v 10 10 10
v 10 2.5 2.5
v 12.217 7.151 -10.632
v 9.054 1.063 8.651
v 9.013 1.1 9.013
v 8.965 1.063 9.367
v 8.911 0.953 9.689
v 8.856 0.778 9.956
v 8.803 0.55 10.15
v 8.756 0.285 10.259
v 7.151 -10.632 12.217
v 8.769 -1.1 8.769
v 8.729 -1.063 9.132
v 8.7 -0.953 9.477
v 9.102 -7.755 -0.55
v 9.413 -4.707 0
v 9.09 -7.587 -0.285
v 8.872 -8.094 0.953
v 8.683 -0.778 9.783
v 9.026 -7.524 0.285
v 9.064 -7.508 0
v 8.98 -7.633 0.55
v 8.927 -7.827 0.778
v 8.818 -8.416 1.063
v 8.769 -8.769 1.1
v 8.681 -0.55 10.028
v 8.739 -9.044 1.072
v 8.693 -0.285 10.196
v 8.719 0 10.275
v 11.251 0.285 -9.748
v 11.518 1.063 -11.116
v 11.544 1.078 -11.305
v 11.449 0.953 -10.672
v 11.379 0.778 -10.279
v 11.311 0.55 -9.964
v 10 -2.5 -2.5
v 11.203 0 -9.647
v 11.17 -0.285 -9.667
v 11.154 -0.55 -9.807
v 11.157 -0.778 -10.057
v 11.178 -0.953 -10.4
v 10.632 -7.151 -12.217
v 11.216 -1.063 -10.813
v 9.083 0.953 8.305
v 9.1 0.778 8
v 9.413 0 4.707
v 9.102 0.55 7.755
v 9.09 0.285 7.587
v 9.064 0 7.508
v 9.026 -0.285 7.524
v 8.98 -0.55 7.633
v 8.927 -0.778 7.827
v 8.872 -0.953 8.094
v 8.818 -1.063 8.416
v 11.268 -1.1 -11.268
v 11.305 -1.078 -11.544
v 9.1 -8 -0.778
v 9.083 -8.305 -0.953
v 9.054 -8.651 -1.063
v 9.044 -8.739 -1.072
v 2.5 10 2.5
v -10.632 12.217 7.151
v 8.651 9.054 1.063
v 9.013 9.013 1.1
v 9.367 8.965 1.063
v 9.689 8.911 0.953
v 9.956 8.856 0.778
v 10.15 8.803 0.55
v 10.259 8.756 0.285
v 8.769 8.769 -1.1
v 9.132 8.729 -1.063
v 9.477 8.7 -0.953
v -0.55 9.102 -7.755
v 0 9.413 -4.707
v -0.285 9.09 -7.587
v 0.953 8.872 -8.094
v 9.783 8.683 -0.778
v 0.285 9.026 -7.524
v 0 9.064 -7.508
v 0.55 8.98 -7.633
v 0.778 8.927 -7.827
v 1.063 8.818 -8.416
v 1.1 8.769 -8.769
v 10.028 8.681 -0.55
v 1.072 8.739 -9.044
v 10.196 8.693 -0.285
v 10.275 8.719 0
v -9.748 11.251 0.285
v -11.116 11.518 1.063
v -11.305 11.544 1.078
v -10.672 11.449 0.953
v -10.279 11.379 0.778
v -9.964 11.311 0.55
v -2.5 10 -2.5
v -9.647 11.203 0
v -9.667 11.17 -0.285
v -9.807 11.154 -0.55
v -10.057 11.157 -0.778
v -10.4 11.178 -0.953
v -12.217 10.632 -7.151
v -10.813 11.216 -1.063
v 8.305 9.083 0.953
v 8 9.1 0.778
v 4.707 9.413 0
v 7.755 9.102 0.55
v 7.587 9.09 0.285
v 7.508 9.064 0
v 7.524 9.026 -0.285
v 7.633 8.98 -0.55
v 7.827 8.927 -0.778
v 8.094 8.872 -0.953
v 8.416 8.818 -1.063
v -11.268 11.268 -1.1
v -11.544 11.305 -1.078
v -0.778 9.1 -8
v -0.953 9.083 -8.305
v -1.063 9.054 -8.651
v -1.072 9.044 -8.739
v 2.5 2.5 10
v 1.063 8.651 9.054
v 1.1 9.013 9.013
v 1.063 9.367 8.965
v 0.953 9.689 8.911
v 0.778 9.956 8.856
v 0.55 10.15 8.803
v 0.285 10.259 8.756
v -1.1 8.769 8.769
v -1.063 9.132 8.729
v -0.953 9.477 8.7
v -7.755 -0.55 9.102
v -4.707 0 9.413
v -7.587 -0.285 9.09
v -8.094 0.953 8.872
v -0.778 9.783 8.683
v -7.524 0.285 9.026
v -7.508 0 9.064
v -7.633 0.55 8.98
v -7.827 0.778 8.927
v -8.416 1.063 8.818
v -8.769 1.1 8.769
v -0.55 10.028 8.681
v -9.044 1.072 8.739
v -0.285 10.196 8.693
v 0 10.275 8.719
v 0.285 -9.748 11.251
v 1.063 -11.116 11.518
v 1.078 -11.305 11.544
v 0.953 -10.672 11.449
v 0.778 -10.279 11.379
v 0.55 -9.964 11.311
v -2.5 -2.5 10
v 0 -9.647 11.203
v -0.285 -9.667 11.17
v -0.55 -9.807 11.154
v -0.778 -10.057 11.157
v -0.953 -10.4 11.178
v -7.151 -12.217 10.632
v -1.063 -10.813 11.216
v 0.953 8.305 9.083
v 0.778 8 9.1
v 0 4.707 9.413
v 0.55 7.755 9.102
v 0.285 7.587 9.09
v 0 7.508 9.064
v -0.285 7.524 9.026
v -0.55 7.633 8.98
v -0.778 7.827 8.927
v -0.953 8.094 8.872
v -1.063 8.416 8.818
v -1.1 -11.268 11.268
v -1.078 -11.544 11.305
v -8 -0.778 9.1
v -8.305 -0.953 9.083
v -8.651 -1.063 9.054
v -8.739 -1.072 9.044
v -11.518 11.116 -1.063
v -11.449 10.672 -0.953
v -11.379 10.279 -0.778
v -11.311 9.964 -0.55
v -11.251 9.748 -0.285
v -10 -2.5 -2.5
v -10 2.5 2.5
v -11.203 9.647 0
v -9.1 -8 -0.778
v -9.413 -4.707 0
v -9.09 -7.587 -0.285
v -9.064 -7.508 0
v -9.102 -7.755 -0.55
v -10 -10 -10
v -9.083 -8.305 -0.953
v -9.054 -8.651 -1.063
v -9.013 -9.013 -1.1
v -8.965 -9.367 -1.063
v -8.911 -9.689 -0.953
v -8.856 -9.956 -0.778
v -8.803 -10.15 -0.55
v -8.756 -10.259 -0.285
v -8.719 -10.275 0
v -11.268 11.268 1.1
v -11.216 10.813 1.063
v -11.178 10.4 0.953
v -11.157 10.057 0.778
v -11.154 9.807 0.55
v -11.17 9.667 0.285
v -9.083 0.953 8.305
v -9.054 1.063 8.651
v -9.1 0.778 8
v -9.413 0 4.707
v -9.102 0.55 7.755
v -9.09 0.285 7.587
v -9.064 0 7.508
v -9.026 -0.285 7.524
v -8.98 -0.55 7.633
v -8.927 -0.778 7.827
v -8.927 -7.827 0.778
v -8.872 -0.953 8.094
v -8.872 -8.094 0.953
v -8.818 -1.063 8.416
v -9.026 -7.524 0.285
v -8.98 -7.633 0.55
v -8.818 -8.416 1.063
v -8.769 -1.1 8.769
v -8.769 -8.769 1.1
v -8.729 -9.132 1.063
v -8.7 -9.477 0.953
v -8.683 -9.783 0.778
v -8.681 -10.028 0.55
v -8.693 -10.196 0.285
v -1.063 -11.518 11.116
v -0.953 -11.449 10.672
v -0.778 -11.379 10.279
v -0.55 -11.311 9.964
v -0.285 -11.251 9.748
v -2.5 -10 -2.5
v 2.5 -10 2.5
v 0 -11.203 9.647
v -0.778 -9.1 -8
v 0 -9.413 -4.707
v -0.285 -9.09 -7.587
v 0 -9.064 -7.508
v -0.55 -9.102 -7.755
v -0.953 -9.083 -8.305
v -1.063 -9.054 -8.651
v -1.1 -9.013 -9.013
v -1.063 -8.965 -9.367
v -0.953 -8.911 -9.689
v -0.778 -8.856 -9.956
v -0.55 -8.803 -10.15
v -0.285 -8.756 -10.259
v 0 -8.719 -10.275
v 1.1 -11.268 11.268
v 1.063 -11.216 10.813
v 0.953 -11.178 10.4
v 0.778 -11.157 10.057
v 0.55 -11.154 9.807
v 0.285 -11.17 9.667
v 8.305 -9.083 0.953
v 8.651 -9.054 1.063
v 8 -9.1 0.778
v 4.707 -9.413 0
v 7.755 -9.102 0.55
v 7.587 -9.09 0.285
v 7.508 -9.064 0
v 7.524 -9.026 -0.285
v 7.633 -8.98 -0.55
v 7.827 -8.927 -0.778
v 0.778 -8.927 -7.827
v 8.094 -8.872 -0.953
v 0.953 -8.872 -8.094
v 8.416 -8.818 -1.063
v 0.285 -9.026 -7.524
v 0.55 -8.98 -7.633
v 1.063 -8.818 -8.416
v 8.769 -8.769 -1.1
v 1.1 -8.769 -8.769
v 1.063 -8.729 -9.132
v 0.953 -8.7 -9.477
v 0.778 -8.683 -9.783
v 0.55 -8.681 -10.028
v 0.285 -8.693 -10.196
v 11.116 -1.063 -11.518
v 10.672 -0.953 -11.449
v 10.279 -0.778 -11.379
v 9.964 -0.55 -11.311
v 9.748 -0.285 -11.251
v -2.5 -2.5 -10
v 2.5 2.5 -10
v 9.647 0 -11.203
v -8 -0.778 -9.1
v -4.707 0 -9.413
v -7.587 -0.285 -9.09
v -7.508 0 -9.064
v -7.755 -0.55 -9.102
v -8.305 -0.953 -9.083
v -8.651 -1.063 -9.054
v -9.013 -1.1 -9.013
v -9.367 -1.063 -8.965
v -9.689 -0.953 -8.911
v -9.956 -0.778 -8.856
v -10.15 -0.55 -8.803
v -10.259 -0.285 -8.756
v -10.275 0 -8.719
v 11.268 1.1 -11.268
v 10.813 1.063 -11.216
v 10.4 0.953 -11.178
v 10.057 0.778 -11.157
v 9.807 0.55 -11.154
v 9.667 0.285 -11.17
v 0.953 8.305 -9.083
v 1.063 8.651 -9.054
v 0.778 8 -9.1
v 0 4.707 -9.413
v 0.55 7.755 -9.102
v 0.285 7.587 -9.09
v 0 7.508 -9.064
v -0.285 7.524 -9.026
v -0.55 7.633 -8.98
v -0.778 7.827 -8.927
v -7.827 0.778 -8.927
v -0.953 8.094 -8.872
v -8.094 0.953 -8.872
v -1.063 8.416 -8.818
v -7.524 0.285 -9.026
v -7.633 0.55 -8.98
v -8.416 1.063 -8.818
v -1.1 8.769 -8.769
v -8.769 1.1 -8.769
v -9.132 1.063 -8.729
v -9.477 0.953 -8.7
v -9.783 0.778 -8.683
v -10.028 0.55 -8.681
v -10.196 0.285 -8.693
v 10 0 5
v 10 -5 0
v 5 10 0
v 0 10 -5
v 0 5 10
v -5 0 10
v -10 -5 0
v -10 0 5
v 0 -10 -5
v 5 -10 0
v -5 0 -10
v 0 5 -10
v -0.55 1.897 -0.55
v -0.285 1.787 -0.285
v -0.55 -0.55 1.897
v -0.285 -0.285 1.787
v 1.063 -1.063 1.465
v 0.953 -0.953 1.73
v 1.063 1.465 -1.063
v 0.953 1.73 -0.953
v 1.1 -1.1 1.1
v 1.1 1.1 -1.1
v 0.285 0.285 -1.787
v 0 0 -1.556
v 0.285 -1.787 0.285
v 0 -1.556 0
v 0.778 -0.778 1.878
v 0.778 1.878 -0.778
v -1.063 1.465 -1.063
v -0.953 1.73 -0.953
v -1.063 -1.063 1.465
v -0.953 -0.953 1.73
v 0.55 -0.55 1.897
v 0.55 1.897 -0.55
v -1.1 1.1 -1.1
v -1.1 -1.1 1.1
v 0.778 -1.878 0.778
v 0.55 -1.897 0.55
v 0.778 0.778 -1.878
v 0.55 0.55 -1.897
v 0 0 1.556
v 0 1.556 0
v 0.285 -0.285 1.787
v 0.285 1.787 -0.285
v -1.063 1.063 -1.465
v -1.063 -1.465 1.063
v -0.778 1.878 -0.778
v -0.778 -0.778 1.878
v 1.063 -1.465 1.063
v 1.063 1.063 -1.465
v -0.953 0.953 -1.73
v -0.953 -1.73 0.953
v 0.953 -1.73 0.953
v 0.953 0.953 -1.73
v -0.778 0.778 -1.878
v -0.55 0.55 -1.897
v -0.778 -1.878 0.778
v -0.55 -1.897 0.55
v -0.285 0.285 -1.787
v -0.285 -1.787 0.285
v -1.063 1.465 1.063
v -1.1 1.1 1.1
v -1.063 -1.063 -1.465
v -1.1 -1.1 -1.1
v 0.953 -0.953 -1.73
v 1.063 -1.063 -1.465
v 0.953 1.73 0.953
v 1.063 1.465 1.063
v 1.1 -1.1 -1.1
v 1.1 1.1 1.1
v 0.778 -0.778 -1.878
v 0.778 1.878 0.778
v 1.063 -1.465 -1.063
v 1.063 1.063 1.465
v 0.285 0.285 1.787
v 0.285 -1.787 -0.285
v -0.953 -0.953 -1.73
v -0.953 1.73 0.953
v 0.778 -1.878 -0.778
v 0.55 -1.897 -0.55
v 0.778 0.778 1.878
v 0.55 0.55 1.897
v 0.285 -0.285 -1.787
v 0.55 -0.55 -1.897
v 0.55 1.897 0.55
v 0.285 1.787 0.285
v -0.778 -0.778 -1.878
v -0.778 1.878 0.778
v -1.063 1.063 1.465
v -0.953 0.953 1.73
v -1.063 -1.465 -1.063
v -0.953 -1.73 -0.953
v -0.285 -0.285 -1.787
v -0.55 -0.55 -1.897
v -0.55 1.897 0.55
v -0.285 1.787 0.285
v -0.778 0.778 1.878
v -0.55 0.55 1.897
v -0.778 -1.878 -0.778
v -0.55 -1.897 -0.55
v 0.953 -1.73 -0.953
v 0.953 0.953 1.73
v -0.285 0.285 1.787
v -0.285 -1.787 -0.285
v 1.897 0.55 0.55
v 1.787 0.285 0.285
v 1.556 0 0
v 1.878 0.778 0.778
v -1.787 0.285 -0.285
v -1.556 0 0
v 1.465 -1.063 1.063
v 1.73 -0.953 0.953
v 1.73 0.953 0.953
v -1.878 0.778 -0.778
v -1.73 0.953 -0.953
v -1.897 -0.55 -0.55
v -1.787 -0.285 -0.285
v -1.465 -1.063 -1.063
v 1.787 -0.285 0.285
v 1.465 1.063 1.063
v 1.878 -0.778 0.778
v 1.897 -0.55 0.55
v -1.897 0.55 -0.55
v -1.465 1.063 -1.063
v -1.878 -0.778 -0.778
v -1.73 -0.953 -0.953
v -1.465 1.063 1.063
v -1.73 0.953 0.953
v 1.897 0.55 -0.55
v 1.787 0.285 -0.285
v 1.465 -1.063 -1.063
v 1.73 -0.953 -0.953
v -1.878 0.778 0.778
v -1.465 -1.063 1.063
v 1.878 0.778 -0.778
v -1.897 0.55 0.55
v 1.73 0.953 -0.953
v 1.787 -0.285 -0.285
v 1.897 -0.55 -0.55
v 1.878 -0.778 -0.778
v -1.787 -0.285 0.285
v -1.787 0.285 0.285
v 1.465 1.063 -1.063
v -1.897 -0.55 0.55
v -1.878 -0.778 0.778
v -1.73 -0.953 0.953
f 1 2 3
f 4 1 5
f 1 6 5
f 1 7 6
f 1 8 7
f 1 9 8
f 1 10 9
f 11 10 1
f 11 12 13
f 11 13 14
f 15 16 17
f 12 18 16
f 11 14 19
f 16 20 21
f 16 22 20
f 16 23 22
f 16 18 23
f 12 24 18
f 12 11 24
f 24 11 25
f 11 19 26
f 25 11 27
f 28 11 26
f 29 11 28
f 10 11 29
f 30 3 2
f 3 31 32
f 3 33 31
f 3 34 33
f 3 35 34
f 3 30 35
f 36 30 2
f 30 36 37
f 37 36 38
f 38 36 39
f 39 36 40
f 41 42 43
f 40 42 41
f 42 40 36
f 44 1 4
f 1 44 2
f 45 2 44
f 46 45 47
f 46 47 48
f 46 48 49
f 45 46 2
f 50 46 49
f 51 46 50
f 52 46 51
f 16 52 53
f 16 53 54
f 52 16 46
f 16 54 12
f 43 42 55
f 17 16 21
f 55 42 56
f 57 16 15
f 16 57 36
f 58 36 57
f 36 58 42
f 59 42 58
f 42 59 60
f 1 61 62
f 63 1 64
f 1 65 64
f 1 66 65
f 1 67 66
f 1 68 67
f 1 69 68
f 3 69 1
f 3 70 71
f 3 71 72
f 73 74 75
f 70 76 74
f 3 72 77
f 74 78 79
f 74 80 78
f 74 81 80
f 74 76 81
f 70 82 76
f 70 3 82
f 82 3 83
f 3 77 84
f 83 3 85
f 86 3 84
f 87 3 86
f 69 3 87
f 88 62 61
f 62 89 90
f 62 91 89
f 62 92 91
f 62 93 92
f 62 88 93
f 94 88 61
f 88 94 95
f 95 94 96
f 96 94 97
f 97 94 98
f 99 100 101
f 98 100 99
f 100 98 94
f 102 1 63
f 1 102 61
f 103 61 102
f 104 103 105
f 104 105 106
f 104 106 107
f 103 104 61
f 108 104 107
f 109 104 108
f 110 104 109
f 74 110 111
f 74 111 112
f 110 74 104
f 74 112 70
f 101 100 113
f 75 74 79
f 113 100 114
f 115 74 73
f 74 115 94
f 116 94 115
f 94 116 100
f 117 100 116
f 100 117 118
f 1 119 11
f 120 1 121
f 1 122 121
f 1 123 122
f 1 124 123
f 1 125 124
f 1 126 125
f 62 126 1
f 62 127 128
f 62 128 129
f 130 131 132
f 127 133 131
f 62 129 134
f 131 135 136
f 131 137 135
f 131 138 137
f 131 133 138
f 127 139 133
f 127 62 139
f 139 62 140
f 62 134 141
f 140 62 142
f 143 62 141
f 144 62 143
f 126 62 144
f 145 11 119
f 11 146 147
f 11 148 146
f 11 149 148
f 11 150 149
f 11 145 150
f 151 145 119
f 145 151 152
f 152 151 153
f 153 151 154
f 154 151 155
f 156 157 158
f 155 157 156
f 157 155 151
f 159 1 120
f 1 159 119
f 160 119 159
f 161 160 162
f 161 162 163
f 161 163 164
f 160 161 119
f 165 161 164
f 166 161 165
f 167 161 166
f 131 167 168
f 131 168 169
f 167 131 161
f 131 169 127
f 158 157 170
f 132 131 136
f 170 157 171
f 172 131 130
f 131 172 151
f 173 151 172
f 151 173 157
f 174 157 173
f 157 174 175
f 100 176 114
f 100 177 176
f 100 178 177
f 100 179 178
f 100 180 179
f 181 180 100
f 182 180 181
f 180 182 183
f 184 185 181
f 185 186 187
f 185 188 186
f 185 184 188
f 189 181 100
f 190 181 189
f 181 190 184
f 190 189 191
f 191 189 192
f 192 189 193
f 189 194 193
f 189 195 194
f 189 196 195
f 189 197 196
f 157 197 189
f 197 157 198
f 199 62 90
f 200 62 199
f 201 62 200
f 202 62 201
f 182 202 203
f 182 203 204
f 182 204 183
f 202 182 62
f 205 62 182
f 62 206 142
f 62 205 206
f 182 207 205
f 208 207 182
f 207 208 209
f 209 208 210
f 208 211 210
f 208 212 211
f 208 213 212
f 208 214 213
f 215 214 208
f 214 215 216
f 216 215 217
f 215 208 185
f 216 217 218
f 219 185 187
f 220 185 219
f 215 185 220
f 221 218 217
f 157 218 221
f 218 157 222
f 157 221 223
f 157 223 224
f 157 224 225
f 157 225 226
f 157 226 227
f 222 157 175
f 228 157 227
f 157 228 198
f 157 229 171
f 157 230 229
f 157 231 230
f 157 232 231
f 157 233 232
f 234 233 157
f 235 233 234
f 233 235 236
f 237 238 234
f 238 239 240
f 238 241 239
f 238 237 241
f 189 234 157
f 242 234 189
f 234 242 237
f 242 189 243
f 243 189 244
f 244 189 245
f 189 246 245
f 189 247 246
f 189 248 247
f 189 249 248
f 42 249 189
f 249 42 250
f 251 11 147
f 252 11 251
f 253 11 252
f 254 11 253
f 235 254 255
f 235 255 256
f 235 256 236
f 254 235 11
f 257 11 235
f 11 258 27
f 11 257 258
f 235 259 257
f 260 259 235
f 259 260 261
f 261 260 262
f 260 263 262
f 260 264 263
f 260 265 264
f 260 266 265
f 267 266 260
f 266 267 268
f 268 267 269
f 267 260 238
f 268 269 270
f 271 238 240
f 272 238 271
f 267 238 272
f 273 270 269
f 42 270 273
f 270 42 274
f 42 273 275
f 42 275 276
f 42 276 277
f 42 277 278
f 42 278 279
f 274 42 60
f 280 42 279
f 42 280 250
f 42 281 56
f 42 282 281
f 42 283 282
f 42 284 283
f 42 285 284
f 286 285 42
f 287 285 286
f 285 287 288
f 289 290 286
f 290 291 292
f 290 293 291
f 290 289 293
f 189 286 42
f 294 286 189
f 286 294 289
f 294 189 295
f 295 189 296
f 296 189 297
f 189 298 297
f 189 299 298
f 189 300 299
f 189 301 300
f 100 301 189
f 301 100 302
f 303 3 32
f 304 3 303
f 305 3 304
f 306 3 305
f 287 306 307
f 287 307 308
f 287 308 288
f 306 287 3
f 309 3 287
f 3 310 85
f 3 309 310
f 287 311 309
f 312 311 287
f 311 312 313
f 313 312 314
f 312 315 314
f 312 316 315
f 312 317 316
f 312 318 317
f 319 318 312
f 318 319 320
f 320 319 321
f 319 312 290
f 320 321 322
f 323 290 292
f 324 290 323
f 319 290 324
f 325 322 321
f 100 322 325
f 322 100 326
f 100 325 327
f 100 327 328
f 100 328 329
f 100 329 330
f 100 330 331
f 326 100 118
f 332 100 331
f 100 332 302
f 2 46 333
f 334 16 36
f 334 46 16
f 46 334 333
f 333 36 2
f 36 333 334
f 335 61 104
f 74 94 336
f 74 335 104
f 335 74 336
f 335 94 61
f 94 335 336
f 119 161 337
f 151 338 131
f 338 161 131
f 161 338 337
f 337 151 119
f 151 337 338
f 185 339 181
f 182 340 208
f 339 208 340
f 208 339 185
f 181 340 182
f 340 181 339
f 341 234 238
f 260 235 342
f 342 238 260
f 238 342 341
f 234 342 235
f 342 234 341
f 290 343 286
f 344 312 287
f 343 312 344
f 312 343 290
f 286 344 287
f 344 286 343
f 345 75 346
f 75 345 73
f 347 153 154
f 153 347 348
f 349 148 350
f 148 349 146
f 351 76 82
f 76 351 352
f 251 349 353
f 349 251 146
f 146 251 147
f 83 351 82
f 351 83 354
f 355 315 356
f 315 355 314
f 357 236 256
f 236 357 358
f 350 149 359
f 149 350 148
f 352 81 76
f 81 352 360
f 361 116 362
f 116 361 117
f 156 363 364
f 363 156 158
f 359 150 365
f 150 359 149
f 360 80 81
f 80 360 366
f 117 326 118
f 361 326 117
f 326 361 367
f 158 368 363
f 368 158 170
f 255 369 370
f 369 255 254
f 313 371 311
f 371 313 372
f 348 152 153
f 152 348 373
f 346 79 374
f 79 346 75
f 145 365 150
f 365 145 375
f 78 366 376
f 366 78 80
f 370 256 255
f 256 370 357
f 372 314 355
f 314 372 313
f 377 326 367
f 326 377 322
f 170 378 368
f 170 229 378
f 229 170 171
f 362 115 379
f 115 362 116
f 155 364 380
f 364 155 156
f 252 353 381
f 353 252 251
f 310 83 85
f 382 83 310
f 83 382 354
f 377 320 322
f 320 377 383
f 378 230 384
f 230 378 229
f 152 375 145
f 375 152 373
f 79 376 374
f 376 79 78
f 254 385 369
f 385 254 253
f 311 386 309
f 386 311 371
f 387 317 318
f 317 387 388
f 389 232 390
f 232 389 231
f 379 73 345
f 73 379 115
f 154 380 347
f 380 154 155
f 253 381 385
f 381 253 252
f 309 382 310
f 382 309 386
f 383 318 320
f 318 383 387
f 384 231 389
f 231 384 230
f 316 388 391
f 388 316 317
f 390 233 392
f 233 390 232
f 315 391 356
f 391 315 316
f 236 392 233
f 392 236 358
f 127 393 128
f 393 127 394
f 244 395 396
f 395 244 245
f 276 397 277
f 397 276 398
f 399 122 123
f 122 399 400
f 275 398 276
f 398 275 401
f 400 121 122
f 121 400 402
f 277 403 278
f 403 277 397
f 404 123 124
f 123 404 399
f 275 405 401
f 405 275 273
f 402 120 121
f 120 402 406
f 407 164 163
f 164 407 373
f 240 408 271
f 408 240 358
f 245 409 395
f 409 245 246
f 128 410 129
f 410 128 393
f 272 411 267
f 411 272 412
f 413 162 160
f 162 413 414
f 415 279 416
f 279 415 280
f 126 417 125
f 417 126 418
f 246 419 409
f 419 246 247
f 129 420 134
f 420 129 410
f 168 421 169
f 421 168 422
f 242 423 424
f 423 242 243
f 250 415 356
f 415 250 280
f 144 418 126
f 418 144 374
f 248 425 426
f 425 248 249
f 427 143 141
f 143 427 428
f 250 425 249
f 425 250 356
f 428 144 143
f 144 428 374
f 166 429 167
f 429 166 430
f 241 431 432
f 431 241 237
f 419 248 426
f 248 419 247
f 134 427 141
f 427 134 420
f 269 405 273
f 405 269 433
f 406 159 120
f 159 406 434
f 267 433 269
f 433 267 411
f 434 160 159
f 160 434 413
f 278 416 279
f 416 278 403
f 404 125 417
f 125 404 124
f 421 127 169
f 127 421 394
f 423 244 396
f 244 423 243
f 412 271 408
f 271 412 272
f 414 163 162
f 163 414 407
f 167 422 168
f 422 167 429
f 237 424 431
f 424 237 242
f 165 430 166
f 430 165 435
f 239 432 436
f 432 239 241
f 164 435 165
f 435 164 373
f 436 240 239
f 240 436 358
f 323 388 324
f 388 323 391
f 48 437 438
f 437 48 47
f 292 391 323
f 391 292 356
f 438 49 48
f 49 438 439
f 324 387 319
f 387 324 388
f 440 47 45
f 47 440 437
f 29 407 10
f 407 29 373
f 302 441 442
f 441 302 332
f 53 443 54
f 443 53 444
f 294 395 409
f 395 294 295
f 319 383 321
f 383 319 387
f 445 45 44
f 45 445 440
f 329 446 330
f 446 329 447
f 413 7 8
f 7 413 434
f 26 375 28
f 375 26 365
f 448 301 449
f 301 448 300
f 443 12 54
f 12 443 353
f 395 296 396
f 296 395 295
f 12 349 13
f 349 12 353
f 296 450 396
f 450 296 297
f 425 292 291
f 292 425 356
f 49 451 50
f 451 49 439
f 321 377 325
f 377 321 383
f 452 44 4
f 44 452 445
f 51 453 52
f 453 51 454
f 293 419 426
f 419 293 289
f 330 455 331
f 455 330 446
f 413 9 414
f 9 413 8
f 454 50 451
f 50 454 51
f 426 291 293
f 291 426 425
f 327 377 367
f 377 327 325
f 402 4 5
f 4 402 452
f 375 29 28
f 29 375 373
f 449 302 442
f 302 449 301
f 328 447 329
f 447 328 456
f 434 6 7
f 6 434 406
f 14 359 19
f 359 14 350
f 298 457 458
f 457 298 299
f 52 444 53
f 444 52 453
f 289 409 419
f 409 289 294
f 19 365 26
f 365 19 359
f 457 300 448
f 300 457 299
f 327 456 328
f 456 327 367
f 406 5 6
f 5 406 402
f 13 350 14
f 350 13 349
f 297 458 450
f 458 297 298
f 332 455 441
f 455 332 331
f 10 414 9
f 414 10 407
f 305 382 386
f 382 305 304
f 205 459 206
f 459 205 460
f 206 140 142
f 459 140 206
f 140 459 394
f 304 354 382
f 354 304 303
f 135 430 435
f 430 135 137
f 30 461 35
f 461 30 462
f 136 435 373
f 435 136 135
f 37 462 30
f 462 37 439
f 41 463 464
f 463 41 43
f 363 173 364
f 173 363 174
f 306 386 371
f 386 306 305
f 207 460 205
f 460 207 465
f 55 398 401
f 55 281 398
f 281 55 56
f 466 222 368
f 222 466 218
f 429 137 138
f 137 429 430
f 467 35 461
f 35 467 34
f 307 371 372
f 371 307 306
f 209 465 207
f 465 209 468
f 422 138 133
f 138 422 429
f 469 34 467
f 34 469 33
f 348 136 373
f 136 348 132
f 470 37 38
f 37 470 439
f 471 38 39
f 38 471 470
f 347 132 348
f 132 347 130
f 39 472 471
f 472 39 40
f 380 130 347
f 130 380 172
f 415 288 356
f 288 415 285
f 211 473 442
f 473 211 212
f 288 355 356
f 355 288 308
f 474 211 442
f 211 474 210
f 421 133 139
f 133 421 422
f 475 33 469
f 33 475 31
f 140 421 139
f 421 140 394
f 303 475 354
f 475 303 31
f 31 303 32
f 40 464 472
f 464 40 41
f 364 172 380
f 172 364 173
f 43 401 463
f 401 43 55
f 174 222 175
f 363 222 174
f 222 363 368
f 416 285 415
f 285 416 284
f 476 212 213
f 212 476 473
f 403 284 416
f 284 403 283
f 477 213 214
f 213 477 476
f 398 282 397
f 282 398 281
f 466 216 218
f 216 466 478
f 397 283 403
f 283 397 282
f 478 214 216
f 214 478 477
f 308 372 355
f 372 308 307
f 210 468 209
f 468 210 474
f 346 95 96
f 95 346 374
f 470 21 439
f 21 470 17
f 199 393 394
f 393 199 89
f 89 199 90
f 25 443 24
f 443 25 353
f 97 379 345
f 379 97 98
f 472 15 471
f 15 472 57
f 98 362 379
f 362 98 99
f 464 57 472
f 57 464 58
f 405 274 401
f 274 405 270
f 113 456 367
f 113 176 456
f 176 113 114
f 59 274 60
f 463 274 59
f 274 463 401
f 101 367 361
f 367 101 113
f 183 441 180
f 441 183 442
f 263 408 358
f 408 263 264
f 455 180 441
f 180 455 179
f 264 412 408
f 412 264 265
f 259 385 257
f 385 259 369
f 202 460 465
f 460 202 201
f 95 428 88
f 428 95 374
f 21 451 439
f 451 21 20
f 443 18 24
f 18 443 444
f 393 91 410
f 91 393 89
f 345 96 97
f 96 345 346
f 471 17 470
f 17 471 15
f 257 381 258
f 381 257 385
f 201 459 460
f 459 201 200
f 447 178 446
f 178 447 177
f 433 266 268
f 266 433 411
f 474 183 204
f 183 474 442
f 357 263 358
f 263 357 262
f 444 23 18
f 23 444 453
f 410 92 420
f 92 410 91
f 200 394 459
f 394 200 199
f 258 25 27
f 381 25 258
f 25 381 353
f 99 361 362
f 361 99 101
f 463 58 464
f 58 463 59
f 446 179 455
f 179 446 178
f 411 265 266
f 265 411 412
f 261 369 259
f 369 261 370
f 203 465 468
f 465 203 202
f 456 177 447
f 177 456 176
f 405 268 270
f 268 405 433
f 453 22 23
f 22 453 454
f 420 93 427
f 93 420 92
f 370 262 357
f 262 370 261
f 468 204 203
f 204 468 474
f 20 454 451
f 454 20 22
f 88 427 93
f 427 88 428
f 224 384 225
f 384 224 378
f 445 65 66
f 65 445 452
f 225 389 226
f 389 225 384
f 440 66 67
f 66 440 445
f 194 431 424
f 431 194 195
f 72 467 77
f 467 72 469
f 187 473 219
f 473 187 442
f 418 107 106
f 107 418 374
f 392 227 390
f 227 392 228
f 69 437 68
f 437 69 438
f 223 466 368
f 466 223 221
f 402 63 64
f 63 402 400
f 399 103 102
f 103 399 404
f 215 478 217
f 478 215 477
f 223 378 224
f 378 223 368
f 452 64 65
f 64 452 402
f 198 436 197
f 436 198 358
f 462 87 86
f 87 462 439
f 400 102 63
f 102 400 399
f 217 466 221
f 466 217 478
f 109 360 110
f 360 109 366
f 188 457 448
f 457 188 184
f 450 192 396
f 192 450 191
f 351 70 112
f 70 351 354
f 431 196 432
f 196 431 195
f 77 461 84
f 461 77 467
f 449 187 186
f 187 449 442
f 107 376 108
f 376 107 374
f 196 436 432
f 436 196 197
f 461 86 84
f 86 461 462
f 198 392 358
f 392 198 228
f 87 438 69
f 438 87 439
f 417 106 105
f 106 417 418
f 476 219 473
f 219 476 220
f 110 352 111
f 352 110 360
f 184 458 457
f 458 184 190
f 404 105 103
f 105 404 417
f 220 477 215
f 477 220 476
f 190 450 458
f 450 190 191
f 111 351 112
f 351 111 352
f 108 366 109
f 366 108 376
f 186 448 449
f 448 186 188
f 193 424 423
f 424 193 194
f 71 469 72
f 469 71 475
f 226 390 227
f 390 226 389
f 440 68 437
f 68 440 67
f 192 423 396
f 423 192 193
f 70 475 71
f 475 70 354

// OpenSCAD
//Шаг сетки для решётки из усечённых октаэдров (межцентровое расстояние)
MM_GRID_STEP = 20;

//диаметр отвертия (диаметр описанной окружности около многоугольника детализации)
//если диаметр = 0, то отверстий нет, 2.2 = диаметр зубочистки
MM_HOLE_DIAMETER = 2.2;

//true либо false параметр, показывающия исходный ромбододекаэдр без скоса
//для подсветки и разработки делай true, для 3Д-печати делай false
WILL_SHOW_CORE = true;

//показывать цвета
WILL_SHOW_COLOR = true;

//надо ли класть фигуру на жёлтую грань?
WILL_PUT_ON_YELLOW_FACE = false;

//длина укороченной чёрной стороны (когда 1 - ось поворта по короткой диагонали)
//ось поворота - это граница цветов 
CUT_RATIO = 0.5;

//синее море внизу и белое небо сверху, если угол положительный
CUT_DEGREE = 10;

//такой n-угольник для детализации отверстия
HOLE_DETALISATION_IS_N_POLYGON = 24;


//дальше параметры не менять
CR = MM_GRID_STEP / 2;
N_ALL_FACES = 6;

//тетраэдр по четырём точкам, точка номер ноль - вершина
module m_tetrahedron(p4) {
    polyhedron(points=p4, faces=[[0,1,2],[0,2,3],[0,3,1],[3,2,1]]);
}

//пирамида с четырёхугольноком в основании, точка номер ноль - вершина
module m_p5_pyramid(p5) {
    polyhedron(points=p5, faces=[[0,1,2],[0,2,3],[0,3,4],[0,4,1],[4,3,2,1]]);
}

//пирамида с треугольным или четырёхугольным основанием
module m_p4_p5(p4_or_p5) {
    if (len(p4_or_p5) != 5) {m_tetrahedron(p4_or_p5);} else {m_p5_pyramid(p4_or_p5);}
}

//интерполирование по прямой с точками р0(ноль) и р1(один) любым вещественным числом
//массивы (три координаты) тоже можно складывать и умножать на число
function f_n01(p0, p1, n01) = ((p1 - p0) * n01) + p0;

//сумма массива с любым числом точек (рекурсивно)
function f_sum_recursion(array_p, my_result, i) =
    ((i>=len(array_p)) ?
        my_result :
        f_sum_recursion(array_p, my_result + array_p[i], i+1));

//сумма векторов, array_p[0] * 0 - нужно, чтобы получить необходимое число нулей [0,0,0]
function f_sum(array_p) = f_sum_recursion(array_p, array_p[0] * 0, 0);

//центр массива точек
function f_center(array_p) = f_sum(array_p) * (1 / len(array_p));

//синтаксис для переменных (в том числе, функциональных переменных)
//my_scale - во сколько раз раздувать (масштабировать) треугольник или 4 точки
function f_three_or_four_points_extend(p3_or_p4, my_scale = 1) =
    //центр тяжести треугольника или четырёх точек
    let (c = f_center(p3_or_p4))
    //функцция раздувания трёх или четырёх точек с сохранением чентра тяжести
    let (f = function (i) f_n01(c, p3_or_p4[i], my_scale))
//раздутый треугольник или раздутые четыре точки
(len(p3_or_p4)==3) ? [f(0), f(1), f(2)] : [f(0), f(1), f(2), f(3)];

//полупространство как треугольная или четырёхугольная пирамида
//берём основание и строим пирамиду с вершиной в нуле
//раздуваем основание; если scale_pyramyd_ratio = 1, то сохраняем пропорции
//если scale_pyramyd_ratio = 2, то вытягиваем пирамиду по высоте в два раза
function f_half_space(p3_or_p4, scale_triangle = 1, scale_pyramyd_ratio = 1) = 
    //раздутое основание
    let (p3_or_p4 = f_three_or_four_points_extend(p3_or_p4, scale_triangle))
    //во сколько раз удлинять растояние от чентра основания до вершины
    let (scale_to_apex = scale_triangle * scale_pyramyd_ratio)
    //вершина пирамиды
    let (p_apex = f_n01(f_center(p3_or_p4), [0,0,0], scale_to_apex))
    //массив: вершина + треугольное основание
    let (arr_3 = [p_apex, p3_or_p4[0], p3_or_p4[1], p3_or_p4[2]])
    //массив: вершина + четырёхугольное основание
    let (arr_4 = [p_apex, p3_or_p4[0], p3_or_p4[1], p3_or_p4[2], p3_or_p4[3]])
//в зависимости от количества точек в основании пирамида труегольная или четырёхугольная
(len(p3_or_p4)==3) ? arr_3 : arr_4;

//координаты вершин усечённого октаэдра
X_Y = [2,1,0]; X_y = [2,-1,0]; X_Z = [2,0,1]; X_z = [2,0,-1];
x_Y = [-2,1,0]; x_y = [-2,-1,0]; x_Z = [-2,0,1]; x_z = [-2,0,-1];
Y_X = [1,2,0]; Y_x = [-1,2,0]; Y_Z = [0,2,1]; Y_z = [0,2,-1];
y_X = [1,-2,0]; y_x = [-1,-2,0]; y_Z = [0,-2,1]; y_z = [0,-2,-1];
Z_X = [1,0,2]; Z_x = [-1,0,2]; Z_Y = [0,1,2]; Z_y = [0,-1,2];
z_X = [1,0,-2]; z_x = [-1,0,-2]; z_Y = [0,1,-2]; z_y = [0,-1,-2];

//вершины каждой грани по часовой стрелке, если смотреть снаружи
//СУММА ПРОТИВОПОЛОЖНЫХ ГРАНЕЙ = 11
//tip - солнце (к какой вершине повёрнута верхняя часть плоскости сечения)


//грани куба по положительным направлениям осей XYZ
face_0 = [X_Z, X_Y, X_z, X_y]; tip_0 = 0;
face_1 = [Y_X, Y_Z, Y_x, Y_z]; tip_1 = 0;
face_2 = [Z_Y, Z_X, Z_y, Z_x]; tip_2 = 0;
//грани куба по отрицательным направлениям осей XYZ
face_3 = [x_y, x_z, x_Y, x_Z]; tip_3 = 0;
face_4 = [y_z, y_x, y_Z, y_X]; tip_4 = 0;
face_5 = [z_x, z_y, z_X, z_Y]; tip_5 = 0;
//четыре грани октаэдра с положительными Х-координатами
face_6 = [Y_X, X_Y, X_Z, Z_X, Z_Y, Y_Z]; tip_6 = 0;
face_7 = [z_X, X_z, X_Y, Y_X, Y_z, z_Y]; tip_7 = 0;
face_8 = [y_X, X_y, X_z, z_X, z_y, y_z]; tip_8 = 0;
face_9 = [Z_X, X_Z, X_y, y_X, y_Z, Z_y]; tip_9 = 0;
//четыре грани октаэдра с отрицательными Х-координатами
face_10 = [Y_X, X_Y, X_Z, Z_X, Z_Y, Y_Z]; tip_10 = 0;
face_11 = [z_X, X_z, X_Y, Y_X, Y_z, z_Y]; tip_11 = 0;
face_12 = [y_X, X_y, X_z, z_X, z_y, y_z]; tip_12 = 0;
face_13 = [Z_X, X_Z, X_y, y_X, y_Z, Z_y]; tip_13 = 0;

//массивы кончиков стрелок, указывающих наверх (на солнце)
tip_indexes_all = [tip_0, tip_1, tip_2, tip_3, tip_4, tip_5];
face_all = [face_0, face_1, face_2, face_3, face_4, face_5];

//нужная точка на грани (когда точка ноль, на неё указывает срелка)
function f_face_iALL_i4(iALL, i4) = face_all[iALL][(i4 + 24 - tip_indexes_all[iALL]) % ((iALL < 6) ? 4 : 6)];
function f_face_iALL(i) = [f_face_iALL_i4(i,0), f_face_iALL_i4(i,1), f_face_iALL_i4(i,2), f_face_iALL_i4(i,3)];

module m_face(i_face, scale_triangle = 1, scale_pyramyd_ratio = 1) {
    p4 = f_face_iALL(i_face);
    
    p_rhombus = [p4[0], p4[1], p4[2], p4[3]];
    
    m_p4_p5(f_half_space(p_rhombus, scale_triangle, scale_pyramyd_ratio)); 
}

function f_axis(p4, my_ratio = CUT_RATIO) = [f_n01(p4[0], p4[1], my_ratio), f_n01(p4[2], p4[3], my_ratio)];

module m_my_rotation_on_axis(i_face, a_deg = CUT_DEGREE, my_ratio = CUT_RATIO) {
    p4 = f_face_iALL(i_face);
    ab = f_axis(p4, my_ratio);
    
    translate(ab[1])
        rotate(a = a_deg, v = ab[1] - ab[0])
            translate(ab[1] * (-1))
                children();
} 
 
module m_rotated_face(i_face, a_deg = CUT_DEGREE, my_ratio = CUT_RATIO) {
    m_my_rotation_on_axis(i_face, a_deg, my_ratio)
        m_face(i_face, 8, 1);
}

B = [0,0,0]; W = [1,1,1];
ARR_COLORS = 
[[0.5,0,0],[0.5,0,0],[0.5,0,0],
 [1,1,0],[1,1,0],[1,1,0],
 [0,0.5,0],[0,0.5,0],[0,0.5,0],[0,0.5,0]];


module m_ALL_faces(will_show_not_rotated_core = WILL_SHOW_CORE, cut_ratio = CUT_RATIO, cut_degree = CUT_DEGREE) {
    intersection_for(n = [0 : N_ALL_FACES - 1]){
        if (WILL_SHOW_COLOR) {
            color(ARR_COLORS[n])
                hull() m_rotated_face(n, cut_degree, cut_ratio);
        }
        else
            hull() m_rotated_face(n, cut_degree, cut_ratio);
    }
    
    if (will_show_not_rotated_core)
    #rotate(0){
        for(tn = [0 : N_ALL_FACES - 1]) {
            m_face(tn);
        }
    }
}


module m_cylinder(rotate_axe=[0,0,1], rotate_deg=45, d=MM_HOLE_DIAMETER, half_h=(MM_GRID_STEP * 0.5) * 4.2) {
    rotate (a=rotate_deg, v=rotate_axe)
        cylinder(h=half_h*2, d=d, center=true, $fn=HOLE_DETALISATION_IS_N_POLYGON);
}

module m_all_cylinders() {
    if (MM_HOLE_DIAMETER > 0) {
        m_cylinder([+1,0,0], +45); m_cylinder([+1,0,0], -45); 
        m_cylinder([0,+1,0], +45); m_cylinder([0,+1,0], -45);
        m_cylinder([+1,+1,0], 90); m_cylinder([+1,-1,0], 90);
    }
}

module m_final(cut_ratio, cut_degree, xyz_n_step = [0,0,0], show_core = WILL_SHOW_CORE) {
    translate(v = xyz_n_step * MM_GRID_STEP)    
        rotate(a = 90 * (WILL_PUT_ON_YELLOW_FACE ? 1 : 0), v=[1,1,0])
            m_my_rotation_on_axis(0, -CUT_DEGREE * (WILL_PUT_ON_YELLOW_FACE ? 1 : 0))
            difference () {
                scale (CR / 2) 
                    m_ALL_faces(show_core, cut_ratio, cut_degree);
                m_all_cylinders();
            }
}

m_final(CUT_RATIO, CUT_DEGREE);
